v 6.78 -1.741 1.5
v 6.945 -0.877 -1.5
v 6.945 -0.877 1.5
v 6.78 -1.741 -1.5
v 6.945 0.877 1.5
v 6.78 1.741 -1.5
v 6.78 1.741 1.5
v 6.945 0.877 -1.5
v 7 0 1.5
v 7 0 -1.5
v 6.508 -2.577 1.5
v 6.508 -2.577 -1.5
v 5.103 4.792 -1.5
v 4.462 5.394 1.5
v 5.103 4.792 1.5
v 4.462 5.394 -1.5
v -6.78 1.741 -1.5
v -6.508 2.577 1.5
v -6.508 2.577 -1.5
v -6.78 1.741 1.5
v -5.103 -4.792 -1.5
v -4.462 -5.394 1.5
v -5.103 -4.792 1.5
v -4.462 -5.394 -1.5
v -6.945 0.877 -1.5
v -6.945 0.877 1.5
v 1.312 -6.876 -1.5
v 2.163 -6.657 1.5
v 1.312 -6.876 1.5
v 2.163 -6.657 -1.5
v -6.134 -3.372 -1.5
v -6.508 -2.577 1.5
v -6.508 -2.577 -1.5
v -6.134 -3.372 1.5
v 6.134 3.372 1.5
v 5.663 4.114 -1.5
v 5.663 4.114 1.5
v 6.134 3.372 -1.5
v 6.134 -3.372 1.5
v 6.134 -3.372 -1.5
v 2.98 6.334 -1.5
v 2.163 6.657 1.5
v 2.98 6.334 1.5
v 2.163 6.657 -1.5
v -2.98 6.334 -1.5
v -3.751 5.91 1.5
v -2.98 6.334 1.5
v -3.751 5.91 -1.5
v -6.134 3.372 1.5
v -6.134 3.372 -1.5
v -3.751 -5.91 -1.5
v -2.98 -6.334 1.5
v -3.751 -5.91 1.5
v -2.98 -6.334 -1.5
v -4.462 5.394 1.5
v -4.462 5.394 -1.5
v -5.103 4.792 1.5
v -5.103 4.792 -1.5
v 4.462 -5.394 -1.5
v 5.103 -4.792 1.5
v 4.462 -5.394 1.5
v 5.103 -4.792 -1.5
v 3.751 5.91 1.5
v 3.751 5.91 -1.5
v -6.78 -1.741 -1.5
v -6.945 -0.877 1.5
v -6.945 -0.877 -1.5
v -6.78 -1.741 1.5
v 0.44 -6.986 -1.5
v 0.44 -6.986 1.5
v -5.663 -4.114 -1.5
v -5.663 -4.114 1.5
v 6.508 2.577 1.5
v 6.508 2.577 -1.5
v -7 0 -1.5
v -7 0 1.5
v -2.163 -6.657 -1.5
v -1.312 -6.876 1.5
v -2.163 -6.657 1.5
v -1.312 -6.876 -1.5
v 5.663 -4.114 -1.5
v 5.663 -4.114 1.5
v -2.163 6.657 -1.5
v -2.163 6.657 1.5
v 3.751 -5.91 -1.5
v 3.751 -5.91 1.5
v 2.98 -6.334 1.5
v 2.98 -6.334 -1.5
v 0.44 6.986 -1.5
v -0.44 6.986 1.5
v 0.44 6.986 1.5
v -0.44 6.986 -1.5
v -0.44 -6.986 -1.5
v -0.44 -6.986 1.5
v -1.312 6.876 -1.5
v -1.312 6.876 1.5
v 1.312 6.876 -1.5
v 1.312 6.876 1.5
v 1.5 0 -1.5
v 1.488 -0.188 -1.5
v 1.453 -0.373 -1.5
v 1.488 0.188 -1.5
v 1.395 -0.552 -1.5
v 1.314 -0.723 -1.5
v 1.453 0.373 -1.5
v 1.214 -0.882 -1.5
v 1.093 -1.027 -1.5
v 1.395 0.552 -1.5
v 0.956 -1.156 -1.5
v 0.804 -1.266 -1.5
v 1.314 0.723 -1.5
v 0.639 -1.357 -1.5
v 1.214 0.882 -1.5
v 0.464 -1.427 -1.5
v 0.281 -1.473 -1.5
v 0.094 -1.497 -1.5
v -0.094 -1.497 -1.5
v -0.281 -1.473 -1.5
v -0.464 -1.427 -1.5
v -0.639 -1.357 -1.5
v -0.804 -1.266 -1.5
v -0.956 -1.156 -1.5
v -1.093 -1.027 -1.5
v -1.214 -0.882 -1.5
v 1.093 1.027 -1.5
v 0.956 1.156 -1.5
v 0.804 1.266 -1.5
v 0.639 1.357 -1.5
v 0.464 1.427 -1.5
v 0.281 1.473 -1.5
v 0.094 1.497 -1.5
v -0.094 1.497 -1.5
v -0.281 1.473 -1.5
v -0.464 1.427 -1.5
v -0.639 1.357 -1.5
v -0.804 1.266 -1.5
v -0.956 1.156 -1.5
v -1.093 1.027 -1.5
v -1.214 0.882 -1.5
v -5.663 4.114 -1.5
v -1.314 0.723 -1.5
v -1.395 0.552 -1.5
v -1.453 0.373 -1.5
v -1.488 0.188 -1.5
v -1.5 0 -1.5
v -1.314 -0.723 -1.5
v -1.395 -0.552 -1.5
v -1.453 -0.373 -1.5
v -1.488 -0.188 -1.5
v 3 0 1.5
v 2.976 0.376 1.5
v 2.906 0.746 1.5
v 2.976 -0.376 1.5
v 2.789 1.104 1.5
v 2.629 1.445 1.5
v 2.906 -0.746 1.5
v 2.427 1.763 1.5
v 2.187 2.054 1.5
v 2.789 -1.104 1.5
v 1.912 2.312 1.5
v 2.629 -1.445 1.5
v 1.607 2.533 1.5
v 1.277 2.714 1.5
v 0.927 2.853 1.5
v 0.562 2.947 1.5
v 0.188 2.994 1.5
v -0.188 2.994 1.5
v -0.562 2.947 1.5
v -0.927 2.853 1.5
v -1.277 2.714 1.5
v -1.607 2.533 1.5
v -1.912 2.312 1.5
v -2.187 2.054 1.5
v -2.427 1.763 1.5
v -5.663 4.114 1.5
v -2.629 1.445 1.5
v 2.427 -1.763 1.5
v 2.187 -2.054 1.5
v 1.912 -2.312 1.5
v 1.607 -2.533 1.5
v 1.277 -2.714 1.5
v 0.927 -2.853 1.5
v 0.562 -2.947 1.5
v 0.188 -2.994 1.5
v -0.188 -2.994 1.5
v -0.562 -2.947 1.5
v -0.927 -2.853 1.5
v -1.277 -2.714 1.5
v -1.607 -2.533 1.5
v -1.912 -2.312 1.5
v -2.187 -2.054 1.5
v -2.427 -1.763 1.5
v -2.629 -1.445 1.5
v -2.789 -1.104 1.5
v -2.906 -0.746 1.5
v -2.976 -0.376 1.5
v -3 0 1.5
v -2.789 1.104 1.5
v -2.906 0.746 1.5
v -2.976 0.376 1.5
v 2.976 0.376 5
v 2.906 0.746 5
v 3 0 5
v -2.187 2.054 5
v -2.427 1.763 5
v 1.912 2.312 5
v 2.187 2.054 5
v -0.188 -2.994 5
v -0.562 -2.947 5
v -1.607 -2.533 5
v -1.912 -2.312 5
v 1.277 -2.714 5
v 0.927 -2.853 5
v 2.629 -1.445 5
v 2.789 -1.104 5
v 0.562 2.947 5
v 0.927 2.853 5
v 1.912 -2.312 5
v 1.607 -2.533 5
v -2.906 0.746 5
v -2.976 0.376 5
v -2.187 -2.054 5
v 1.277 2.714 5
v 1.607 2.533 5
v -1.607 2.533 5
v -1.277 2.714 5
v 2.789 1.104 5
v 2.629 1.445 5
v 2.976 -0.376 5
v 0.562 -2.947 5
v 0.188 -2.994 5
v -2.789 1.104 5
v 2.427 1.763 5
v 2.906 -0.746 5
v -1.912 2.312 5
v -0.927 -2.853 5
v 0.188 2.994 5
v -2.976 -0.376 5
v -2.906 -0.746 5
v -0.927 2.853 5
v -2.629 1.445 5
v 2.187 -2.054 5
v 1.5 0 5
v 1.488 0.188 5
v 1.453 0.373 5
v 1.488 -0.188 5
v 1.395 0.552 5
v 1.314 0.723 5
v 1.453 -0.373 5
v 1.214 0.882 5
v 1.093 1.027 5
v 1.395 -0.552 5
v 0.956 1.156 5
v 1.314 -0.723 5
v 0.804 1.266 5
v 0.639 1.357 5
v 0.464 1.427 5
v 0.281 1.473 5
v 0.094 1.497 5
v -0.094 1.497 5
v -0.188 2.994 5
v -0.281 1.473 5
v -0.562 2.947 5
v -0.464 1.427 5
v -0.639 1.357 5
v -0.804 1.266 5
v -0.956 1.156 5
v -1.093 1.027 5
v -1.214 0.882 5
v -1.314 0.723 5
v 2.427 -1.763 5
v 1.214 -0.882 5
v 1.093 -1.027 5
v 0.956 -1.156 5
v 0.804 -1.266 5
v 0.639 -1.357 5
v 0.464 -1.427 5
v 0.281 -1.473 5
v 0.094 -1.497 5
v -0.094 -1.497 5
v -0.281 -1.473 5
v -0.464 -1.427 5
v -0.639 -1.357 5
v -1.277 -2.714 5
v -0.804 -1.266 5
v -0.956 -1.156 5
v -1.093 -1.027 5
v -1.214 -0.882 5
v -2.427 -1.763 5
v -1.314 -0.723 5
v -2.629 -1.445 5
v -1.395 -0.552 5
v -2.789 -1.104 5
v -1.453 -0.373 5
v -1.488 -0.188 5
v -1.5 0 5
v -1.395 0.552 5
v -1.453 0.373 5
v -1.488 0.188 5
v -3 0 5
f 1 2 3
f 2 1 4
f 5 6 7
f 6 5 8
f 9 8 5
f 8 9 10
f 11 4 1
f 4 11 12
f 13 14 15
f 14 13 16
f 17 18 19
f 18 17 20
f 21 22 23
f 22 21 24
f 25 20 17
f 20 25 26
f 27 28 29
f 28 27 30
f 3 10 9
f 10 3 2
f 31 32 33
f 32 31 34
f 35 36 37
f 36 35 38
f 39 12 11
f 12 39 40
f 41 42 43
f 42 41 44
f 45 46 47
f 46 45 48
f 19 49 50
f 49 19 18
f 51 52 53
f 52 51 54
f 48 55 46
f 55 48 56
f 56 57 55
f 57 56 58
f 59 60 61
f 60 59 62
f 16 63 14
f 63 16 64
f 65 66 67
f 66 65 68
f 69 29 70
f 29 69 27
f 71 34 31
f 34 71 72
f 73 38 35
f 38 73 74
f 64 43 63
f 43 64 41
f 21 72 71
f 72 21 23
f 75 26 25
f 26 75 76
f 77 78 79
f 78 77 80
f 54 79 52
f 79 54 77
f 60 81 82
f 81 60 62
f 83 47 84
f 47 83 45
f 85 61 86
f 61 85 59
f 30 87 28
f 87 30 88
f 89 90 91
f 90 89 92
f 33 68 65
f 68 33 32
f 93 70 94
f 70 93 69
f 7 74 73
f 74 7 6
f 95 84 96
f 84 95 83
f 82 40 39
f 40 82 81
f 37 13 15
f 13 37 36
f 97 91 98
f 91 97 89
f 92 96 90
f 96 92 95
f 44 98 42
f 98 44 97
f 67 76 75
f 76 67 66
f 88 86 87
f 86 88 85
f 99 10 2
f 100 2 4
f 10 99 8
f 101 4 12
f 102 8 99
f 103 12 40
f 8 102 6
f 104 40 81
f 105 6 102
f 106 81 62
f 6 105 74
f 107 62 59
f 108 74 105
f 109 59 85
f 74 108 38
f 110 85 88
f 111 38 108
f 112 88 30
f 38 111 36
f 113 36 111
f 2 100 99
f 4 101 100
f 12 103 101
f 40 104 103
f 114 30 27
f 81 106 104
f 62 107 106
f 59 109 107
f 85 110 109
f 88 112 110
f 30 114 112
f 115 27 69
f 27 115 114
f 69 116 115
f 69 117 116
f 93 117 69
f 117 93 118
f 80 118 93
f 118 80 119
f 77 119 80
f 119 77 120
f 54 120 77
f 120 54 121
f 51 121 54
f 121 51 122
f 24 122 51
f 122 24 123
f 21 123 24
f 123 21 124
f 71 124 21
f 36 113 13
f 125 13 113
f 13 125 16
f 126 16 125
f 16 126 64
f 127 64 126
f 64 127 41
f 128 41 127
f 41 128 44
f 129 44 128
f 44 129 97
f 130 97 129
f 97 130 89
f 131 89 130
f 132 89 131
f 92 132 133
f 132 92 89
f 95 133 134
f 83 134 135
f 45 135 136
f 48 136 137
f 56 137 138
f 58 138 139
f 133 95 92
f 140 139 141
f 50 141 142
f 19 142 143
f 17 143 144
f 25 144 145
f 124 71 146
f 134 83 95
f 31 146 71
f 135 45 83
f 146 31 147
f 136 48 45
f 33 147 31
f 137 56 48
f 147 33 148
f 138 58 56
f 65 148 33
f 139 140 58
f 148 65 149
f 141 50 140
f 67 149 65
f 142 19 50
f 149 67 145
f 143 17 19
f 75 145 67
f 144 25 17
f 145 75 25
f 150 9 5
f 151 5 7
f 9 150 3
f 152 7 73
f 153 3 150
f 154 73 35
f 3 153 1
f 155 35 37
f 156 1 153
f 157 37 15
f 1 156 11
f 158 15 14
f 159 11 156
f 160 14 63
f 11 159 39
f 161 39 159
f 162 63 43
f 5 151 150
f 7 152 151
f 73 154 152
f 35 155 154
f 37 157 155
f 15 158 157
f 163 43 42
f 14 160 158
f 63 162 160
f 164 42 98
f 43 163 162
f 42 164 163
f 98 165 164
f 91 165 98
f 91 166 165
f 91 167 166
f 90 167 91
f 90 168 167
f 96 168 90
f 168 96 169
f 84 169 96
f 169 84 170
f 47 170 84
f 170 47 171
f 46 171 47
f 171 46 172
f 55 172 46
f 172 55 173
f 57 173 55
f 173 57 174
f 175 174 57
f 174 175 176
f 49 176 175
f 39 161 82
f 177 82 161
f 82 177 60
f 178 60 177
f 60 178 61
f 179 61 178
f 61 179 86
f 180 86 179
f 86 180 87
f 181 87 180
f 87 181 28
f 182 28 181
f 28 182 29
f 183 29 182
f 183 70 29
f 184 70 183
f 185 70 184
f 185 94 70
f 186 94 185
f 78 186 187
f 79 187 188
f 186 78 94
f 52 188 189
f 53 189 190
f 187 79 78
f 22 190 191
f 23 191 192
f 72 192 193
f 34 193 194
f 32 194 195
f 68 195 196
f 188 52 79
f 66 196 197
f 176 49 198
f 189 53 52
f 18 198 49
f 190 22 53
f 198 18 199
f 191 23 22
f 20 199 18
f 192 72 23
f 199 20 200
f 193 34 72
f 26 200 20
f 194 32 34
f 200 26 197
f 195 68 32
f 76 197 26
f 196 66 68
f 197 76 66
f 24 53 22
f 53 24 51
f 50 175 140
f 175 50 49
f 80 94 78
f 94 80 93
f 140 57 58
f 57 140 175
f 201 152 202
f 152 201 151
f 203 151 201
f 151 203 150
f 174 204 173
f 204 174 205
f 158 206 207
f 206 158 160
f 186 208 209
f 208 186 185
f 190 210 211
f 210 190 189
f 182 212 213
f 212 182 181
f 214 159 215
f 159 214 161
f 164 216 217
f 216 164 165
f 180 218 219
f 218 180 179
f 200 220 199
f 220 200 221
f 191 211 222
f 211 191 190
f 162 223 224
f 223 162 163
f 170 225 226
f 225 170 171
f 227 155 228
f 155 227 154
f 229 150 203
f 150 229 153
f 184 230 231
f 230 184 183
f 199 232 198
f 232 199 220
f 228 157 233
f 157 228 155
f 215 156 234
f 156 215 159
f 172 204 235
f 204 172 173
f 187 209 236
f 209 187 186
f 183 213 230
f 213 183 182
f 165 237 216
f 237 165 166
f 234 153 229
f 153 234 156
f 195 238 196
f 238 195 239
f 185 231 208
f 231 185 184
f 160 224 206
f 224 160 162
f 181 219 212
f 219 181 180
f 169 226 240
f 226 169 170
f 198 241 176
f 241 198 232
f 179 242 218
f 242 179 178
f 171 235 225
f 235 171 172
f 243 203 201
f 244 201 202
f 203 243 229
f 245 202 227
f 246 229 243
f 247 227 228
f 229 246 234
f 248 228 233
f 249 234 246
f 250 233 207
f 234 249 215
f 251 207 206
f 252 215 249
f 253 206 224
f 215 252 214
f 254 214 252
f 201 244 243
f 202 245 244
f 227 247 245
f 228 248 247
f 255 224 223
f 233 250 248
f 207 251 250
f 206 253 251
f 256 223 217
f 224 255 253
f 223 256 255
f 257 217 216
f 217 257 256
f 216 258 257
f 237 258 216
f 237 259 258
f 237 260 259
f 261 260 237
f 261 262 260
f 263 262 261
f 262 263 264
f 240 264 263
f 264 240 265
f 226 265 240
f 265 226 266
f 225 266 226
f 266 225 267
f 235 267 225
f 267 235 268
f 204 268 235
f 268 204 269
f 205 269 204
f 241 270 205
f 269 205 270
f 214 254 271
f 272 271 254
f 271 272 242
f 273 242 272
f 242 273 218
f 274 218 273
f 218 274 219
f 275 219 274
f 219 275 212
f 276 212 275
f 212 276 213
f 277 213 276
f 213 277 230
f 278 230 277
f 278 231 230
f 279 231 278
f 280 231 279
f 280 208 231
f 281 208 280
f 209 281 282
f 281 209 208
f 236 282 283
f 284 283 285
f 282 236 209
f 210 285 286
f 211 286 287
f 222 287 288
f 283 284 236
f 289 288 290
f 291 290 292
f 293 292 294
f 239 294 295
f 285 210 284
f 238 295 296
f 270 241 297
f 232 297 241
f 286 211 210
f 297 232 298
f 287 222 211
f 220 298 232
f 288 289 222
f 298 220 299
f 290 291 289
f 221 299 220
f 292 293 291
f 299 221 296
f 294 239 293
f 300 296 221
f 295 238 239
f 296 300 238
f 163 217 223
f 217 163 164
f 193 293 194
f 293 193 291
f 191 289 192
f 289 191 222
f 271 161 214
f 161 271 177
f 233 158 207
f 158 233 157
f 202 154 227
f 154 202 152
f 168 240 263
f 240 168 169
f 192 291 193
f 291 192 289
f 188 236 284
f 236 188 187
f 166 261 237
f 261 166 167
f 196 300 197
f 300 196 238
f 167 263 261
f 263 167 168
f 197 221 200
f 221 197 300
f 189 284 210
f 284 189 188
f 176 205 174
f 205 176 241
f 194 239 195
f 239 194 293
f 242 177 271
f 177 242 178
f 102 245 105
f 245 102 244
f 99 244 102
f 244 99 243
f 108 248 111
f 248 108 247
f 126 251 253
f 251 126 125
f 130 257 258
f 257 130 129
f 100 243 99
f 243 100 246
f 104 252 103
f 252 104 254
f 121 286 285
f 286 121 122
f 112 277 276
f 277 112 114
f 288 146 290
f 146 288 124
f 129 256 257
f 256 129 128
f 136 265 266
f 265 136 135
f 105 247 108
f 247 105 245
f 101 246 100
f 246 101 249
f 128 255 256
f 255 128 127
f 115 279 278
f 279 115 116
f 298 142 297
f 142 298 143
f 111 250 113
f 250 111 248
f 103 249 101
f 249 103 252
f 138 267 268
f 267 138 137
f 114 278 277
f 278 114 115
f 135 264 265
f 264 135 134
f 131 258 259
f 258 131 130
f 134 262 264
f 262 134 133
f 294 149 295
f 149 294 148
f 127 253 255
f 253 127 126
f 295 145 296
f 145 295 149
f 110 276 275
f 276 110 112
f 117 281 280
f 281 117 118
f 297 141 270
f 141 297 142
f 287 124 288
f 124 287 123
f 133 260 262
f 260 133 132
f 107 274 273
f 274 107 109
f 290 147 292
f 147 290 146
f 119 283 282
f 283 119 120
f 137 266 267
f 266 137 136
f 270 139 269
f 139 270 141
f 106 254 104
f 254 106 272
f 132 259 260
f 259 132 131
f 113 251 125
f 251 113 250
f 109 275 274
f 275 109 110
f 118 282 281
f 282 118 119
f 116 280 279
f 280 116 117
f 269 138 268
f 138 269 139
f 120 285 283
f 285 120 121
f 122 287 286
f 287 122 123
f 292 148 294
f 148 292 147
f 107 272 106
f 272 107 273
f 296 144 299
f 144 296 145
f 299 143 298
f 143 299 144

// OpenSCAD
$fn = 50;


difference() {
	union() {
		translate(v = [0, 0, -1.5000000000]) {
			cylinder(h = 3, r = 7.0000000000);
		}
		translate(v = [0, 0, -1.5000000000]) {
			cylinder(h = 6.5000000000, r = 3.0000000000);
		}
	}
	union() {
		translate(v = [0, 0, -100.0000000000]) {
			cylinder(h = 200, r = 1.5000000000);
		}
	}
}
